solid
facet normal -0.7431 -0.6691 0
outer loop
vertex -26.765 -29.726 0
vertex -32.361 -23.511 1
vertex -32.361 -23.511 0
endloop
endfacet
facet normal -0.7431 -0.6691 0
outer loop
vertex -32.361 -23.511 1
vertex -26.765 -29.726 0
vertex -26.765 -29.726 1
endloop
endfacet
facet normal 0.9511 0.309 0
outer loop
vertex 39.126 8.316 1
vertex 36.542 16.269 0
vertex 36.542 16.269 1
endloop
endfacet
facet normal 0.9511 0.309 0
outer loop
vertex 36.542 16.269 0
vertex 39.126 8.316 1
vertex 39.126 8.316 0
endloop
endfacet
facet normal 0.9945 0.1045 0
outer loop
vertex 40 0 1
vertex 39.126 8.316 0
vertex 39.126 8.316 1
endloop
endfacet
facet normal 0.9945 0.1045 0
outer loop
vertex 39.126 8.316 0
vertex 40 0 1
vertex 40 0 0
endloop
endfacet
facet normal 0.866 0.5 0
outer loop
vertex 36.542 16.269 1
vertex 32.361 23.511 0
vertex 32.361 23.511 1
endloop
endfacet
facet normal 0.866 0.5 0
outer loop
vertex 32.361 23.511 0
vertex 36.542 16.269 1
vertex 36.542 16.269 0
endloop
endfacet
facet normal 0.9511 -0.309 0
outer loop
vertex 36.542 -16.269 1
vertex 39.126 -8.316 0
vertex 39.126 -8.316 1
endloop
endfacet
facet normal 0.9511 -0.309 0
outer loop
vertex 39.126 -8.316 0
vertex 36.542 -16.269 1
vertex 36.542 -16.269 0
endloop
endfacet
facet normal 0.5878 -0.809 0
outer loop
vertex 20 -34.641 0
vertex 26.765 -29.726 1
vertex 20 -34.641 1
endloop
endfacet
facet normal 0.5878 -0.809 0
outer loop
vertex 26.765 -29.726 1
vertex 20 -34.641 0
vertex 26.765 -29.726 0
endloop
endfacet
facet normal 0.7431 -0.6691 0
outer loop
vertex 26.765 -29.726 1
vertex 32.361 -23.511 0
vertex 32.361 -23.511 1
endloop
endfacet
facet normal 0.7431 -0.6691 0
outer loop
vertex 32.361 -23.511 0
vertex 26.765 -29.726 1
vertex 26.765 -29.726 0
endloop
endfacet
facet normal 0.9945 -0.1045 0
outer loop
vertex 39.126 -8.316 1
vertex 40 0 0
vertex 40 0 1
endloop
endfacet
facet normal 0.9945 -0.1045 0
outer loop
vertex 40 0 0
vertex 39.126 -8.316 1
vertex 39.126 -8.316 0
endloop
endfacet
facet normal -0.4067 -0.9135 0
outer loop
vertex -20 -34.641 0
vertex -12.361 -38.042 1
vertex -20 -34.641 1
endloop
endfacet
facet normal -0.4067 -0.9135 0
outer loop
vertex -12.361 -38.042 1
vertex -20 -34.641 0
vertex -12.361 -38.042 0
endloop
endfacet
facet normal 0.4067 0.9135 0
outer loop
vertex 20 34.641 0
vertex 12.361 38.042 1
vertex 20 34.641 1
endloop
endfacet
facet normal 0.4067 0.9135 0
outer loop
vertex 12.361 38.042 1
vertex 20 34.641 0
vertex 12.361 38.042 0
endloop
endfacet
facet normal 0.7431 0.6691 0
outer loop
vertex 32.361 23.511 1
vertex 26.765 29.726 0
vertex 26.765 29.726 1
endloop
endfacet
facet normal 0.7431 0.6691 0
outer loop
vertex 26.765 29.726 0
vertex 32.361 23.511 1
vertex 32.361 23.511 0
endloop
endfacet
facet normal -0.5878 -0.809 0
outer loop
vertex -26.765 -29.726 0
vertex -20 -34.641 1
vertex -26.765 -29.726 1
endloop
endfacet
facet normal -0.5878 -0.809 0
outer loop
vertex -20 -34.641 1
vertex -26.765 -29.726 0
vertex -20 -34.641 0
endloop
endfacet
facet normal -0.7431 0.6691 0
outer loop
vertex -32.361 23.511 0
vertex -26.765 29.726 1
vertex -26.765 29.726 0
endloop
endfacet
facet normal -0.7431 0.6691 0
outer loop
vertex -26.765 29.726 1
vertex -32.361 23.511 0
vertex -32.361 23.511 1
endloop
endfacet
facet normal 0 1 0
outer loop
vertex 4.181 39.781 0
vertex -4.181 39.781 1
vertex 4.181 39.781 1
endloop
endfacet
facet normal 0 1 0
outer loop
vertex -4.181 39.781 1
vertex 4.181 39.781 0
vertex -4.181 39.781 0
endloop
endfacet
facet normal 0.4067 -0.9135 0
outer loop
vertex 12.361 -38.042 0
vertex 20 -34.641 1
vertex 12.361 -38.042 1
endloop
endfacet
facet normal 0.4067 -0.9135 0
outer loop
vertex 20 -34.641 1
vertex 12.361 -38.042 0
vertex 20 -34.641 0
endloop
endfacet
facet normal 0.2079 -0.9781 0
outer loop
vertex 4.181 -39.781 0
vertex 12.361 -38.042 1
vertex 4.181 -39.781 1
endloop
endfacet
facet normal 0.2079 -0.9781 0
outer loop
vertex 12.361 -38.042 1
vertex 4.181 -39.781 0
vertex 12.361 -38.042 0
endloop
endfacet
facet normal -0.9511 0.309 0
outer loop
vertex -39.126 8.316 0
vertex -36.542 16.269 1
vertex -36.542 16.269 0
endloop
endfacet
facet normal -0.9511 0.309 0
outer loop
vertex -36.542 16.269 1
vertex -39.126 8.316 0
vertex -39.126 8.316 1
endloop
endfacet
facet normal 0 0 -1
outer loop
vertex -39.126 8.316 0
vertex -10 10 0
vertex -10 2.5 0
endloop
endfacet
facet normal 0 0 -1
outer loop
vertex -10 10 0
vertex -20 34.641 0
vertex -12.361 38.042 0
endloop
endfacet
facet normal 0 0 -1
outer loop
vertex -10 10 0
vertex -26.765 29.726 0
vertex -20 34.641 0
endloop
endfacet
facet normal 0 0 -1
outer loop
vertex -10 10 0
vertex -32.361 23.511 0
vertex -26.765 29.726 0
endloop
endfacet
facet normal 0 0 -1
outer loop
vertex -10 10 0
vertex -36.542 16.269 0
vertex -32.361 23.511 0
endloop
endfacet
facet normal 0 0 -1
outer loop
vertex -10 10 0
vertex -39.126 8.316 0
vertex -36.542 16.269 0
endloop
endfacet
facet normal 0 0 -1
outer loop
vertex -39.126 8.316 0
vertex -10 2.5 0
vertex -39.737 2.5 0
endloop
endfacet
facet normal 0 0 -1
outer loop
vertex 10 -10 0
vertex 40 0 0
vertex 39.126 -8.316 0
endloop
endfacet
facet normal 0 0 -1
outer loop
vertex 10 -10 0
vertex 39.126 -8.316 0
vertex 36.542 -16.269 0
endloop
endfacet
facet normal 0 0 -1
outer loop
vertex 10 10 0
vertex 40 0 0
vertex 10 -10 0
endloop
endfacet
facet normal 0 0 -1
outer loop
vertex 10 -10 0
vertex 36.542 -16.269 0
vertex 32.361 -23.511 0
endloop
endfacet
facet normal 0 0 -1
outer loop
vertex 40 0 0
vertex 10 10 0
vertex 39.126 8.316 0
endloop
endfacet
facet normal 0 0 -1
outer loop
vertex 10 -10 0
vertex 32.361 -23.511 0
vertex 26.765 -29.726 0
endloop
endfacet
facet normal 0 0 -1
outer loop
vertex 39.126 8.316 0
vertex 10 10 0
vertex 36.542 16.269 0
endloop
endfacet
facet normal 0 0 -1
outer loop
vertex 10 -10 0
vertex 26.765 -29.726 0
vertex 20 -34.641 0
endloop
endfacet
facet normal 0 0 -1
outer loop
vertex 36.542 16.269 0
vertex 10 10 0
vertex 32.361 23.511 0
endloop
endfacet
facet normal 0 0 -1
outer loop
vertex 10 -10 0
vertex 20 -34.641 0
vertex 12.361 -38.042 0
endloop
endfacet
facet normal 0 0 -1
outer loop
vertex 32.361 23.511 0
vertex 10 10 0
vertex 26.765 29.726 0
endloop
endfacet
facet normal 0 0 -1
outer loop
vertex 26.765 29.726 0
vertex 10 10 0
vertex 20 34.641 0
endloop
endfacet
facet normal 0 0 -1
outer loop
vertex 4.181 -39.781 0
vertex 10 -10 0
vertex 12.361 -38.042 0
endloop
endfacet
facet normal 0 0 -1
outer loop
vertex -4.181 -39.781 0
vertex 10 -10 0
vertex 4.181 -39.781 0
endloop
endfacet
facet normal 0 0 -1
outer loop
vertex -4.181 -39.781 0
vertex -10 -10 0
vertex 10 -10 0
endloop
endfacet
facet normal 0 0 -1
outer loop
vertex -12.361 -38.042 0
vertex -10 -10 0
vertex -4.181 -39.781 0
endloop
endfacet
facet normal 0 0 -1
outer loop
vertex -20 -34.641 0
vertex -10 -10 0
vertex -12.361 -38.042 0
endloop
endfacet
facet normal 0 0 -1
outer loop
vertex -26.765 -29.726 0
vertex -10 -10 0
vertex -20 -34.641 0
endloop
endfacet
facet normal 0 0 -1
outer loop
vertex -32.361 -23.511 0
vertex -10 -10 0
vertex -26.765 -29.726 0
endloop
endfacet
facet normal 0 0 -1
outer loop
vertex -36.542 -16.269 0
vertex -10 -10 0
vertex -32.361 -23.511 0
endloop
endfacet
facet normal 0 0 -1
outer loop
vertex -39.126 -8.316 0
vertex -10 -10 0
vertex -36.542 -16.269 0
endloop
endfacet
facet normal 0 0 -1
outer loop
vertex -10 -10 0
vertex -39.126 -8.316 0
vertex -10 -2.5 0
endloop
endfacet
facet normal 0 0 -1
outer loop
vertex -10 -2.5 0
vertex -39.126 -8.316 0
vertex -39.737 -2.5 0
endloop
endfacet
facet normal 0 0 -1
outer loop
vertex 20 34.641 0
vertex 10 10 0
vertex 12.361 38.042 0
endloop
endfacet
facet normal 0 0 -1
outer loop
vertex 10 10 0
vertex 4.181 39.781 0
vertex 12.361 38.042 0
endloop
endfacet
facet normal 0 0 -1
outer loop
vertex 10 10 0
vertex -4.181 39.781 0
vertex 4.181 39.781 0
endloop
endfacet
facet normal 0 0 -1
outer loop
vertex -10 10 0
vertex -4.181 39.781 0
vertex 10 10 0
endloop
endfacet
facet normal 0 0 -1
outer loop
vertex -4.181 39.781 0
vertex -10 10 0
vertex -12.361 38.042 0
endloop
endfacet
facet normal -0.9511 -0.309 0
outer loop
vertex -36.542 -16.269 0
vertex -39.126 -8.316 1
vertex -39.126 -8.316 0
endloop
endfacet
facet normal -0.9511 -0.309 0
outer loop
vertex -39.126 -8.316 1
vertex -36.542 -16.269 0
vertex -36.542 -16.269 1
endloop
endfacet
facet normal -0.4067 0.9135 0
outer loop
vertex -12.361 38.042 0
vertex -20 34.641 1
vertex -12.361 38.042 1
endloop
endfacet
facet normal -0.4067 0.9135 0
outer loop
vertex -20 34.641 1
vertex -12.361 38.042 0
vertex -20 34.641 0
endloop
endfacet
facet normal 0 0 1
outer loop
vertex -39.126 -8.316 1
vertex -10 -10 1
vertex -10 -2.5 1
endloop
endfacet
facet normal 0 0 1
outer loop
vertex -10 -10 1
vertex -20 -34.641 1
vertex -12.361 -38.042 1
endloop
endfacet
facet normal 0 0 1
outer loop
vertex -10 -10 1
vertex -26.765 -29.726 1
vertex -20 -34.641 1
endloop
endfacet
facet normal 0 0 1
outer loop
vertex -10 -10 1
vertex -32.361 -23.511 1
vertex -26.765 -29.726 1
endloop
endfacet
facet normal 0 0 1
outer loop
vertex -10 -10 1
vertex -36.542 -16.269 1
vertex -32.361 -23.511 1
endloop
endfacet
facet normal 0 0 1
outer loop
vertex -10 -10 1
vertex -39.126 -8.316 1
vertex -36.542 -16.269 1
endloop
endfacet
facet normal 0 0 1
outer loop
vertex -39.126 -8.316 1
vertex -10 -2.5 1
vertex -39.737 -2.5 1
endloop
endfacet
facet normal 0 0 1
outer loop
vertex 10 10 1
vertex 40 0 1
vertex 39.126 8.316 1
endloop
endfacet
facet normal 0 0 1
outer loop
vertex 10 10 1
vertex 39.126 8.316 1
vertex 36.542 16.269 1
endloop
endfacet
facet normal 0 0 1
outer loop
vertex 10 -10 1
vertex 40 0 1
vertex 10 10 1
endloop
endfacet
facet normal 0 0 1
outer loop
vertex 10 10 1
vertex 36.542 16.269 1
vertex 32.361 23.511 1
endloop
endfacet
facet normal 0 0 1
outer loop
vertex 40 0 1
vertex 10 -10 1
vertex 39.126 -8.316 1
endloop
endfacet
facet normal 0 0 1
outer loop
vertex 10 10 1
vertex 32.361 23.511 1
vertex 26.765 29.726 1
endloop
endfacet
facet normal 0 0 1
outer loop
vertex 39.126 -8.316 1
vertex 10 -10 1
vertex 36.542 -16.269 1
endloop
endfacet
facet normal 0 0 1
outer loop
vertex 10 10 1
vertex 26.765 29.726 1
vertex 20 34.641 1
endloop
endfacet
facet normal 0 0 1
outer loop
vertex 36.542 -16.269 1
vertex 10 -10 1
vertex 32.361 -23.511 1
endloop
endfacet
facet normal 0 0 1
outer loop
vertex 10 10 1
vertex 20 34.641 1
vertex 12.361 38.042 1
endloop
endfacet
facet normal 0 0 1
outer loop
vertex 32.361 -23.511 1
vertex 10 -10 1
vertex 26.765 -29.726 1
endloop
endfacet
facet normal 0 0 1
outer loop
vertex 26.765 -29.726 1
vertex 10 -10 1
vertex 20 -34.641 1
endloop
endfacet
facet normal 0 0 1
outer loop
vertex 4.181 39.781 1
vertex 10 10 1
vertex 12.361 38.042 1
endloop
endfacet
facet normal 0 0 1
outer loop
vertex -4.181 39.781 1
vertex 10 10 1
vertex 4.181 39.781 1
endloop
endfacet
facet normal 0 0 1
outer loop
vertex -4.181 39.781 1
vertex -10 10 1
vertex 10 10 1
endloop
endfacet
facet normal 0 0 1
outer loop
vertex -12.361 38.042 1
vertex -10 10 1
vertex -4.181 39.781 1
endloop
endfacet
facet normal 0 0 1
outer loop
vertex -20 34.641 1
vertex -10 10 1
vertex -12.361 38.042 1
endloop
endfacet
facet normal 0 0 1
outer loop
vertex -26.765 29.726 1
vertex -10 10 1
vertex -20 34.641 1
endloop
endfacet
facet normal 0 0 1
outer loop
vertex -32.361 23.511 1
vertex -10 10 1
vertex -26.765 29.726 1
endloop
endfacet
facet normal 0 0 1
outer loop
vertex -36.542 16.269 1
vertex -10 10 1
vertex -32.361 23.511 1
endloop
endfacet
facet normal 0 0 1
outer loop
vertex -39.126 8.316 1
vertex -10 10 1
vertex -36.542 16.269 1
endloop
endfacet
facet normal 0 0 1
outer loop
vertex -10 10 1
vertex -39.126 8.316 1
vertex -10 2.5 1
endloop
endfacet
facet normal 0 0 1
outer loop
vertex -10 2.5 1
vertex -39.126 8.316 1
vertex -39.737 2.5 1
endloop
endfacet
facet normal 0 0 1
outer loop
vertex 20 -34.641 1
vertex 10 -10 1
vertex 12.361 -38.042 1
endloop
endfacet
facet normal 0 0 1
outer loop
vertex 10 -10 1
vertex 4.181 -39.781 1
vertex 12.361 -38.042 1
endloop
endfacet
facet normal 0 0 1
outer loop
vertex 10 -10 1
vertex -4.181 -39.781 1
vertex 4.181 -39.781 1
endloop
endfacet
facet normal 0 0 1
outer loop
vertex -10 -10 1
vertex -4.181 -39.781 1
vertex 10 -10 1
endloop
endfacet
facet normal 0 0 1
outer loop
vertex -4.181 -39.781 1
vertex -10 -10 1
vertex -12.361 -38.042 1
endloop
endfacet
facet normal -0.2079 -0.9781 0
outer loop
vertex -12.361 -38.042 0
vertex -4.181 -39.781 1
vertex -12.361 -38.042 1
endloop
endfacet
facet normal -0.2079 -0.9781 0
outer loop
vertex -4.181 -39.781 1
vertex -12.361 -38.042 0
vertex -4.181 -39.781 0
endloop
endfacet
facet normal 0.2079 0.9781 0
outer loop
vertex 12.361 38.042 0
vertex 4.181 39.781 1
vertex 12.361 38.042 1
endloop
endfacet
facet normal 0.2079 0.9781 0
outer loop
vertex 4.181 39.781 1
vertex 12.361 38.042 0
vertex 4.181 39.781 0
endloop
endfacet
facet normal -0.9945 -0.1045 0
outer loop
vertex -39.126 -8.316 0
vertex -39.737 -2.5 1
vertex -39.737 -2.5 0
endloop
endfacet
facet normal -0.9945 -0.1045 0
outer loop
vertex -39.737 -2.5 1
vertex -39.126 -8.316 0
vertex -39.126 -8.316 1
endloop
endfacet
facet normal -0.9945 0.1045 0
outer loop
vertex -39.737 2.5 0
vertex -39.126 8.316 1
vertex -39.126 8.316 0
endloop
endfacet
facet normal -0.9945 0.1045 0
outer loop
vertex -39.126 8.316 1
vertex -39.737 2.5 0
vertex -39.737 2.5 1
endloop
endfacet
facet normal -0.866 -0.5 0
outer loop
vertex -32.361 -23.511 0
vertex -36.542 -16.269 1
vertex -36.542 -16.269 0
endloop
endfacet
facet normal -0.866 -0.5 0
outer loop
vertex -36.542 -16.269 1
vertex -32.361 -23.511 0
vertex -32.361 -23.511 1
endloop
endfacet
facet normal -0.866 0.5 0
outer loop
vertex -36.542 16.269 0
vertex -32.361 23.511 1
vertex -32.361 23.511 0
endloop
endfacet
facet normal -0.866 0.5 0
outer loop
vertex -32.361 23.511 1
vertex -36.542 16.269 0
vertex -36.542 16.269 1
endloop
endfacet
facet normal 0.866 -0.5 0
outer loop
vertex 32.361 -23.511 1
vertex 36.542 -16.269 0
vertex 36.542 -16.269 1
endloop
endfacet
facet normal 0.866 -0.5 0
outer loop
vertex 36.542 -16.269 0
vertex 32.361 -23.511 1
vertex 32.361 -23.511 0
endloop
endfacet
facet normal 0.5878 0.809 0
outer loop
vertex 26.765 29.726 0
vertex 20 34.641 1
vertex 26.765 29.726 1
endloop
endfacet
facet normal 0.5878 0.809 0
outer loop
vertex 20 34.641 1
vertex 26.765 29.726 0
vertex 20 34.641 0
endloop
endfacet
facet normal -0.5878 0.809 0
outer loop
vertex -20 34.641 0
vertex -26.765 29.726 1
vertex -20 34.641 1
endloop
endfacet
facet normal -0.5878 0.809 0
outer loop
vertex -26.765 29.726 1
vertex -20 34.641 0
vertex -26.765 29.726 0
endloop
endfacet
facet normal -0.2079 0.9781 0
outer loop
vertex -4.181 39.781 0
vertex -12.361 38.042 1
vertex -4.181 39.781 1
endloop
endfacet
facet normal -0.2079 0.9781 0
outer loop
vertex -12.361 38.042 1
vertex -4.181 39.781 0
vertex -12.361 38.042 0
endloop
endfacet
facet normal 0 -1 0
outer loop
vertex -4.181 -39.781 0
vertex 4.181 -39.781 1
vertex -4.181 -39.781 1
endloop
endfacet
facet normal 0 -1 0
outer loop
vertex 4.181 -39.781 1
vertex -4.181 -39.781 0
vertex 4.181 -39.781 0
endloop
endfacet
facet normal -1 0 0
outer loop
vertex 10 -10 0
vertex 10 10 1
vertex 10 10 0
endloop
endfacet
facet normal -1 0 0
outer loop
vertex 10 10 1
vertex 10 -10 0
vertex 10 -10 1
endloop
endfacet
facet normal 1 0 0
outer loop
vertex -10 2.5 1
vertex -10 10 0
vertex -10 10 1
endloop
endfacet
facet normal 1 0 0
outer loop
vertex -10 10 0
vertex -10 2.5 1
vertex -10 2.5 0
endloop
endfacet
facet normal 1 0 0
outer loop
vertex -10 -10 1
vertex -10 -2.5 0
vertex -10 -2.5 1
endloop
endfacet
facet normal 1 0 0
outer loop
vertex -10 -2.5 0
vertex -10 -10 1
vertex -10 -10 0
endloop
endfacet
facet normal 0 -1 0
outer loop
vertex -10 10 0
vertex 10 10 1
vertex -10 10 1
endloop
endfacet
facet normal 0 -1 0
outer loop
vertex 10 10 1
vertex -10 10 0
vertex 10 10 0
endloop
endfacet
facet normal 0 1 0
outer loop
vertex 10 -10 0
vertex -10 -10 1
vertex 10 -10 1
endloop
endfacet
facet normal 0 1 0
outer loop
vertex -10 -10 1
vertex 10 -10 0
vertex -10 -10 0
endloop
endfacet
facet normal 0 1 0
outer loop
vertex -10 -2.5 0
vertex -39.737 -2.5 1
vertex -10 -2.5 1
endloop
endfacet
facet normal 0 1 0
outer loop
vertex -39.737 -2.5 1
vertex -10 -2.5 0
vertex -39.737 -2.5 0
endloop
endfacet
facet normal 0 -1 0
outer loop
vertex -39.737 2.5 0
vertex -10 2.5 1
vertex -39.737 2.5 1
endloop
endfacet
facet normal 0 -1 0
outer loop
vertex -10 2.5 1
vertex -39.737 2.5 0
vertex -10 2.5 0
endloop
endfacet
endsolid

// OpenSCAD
/* Uberized Simple Clothing Rack Divider */

// Inner Hole Diameter
box = 20;

// Outer Hole Diameter
outer = 80;

// Thickness
thick = 1;

// Cutout Size
cutout= 5;

difference() {
cylinder(r=outer/2, h=thick);
#translate([-box/2, -box/2 , -thick/2])
    cube([box, box, thick*2]);
#rotate(180)
#translate([0  , -cutout/2  , -thick/2])
    cube([outer, cutout, thick*2]);
}
